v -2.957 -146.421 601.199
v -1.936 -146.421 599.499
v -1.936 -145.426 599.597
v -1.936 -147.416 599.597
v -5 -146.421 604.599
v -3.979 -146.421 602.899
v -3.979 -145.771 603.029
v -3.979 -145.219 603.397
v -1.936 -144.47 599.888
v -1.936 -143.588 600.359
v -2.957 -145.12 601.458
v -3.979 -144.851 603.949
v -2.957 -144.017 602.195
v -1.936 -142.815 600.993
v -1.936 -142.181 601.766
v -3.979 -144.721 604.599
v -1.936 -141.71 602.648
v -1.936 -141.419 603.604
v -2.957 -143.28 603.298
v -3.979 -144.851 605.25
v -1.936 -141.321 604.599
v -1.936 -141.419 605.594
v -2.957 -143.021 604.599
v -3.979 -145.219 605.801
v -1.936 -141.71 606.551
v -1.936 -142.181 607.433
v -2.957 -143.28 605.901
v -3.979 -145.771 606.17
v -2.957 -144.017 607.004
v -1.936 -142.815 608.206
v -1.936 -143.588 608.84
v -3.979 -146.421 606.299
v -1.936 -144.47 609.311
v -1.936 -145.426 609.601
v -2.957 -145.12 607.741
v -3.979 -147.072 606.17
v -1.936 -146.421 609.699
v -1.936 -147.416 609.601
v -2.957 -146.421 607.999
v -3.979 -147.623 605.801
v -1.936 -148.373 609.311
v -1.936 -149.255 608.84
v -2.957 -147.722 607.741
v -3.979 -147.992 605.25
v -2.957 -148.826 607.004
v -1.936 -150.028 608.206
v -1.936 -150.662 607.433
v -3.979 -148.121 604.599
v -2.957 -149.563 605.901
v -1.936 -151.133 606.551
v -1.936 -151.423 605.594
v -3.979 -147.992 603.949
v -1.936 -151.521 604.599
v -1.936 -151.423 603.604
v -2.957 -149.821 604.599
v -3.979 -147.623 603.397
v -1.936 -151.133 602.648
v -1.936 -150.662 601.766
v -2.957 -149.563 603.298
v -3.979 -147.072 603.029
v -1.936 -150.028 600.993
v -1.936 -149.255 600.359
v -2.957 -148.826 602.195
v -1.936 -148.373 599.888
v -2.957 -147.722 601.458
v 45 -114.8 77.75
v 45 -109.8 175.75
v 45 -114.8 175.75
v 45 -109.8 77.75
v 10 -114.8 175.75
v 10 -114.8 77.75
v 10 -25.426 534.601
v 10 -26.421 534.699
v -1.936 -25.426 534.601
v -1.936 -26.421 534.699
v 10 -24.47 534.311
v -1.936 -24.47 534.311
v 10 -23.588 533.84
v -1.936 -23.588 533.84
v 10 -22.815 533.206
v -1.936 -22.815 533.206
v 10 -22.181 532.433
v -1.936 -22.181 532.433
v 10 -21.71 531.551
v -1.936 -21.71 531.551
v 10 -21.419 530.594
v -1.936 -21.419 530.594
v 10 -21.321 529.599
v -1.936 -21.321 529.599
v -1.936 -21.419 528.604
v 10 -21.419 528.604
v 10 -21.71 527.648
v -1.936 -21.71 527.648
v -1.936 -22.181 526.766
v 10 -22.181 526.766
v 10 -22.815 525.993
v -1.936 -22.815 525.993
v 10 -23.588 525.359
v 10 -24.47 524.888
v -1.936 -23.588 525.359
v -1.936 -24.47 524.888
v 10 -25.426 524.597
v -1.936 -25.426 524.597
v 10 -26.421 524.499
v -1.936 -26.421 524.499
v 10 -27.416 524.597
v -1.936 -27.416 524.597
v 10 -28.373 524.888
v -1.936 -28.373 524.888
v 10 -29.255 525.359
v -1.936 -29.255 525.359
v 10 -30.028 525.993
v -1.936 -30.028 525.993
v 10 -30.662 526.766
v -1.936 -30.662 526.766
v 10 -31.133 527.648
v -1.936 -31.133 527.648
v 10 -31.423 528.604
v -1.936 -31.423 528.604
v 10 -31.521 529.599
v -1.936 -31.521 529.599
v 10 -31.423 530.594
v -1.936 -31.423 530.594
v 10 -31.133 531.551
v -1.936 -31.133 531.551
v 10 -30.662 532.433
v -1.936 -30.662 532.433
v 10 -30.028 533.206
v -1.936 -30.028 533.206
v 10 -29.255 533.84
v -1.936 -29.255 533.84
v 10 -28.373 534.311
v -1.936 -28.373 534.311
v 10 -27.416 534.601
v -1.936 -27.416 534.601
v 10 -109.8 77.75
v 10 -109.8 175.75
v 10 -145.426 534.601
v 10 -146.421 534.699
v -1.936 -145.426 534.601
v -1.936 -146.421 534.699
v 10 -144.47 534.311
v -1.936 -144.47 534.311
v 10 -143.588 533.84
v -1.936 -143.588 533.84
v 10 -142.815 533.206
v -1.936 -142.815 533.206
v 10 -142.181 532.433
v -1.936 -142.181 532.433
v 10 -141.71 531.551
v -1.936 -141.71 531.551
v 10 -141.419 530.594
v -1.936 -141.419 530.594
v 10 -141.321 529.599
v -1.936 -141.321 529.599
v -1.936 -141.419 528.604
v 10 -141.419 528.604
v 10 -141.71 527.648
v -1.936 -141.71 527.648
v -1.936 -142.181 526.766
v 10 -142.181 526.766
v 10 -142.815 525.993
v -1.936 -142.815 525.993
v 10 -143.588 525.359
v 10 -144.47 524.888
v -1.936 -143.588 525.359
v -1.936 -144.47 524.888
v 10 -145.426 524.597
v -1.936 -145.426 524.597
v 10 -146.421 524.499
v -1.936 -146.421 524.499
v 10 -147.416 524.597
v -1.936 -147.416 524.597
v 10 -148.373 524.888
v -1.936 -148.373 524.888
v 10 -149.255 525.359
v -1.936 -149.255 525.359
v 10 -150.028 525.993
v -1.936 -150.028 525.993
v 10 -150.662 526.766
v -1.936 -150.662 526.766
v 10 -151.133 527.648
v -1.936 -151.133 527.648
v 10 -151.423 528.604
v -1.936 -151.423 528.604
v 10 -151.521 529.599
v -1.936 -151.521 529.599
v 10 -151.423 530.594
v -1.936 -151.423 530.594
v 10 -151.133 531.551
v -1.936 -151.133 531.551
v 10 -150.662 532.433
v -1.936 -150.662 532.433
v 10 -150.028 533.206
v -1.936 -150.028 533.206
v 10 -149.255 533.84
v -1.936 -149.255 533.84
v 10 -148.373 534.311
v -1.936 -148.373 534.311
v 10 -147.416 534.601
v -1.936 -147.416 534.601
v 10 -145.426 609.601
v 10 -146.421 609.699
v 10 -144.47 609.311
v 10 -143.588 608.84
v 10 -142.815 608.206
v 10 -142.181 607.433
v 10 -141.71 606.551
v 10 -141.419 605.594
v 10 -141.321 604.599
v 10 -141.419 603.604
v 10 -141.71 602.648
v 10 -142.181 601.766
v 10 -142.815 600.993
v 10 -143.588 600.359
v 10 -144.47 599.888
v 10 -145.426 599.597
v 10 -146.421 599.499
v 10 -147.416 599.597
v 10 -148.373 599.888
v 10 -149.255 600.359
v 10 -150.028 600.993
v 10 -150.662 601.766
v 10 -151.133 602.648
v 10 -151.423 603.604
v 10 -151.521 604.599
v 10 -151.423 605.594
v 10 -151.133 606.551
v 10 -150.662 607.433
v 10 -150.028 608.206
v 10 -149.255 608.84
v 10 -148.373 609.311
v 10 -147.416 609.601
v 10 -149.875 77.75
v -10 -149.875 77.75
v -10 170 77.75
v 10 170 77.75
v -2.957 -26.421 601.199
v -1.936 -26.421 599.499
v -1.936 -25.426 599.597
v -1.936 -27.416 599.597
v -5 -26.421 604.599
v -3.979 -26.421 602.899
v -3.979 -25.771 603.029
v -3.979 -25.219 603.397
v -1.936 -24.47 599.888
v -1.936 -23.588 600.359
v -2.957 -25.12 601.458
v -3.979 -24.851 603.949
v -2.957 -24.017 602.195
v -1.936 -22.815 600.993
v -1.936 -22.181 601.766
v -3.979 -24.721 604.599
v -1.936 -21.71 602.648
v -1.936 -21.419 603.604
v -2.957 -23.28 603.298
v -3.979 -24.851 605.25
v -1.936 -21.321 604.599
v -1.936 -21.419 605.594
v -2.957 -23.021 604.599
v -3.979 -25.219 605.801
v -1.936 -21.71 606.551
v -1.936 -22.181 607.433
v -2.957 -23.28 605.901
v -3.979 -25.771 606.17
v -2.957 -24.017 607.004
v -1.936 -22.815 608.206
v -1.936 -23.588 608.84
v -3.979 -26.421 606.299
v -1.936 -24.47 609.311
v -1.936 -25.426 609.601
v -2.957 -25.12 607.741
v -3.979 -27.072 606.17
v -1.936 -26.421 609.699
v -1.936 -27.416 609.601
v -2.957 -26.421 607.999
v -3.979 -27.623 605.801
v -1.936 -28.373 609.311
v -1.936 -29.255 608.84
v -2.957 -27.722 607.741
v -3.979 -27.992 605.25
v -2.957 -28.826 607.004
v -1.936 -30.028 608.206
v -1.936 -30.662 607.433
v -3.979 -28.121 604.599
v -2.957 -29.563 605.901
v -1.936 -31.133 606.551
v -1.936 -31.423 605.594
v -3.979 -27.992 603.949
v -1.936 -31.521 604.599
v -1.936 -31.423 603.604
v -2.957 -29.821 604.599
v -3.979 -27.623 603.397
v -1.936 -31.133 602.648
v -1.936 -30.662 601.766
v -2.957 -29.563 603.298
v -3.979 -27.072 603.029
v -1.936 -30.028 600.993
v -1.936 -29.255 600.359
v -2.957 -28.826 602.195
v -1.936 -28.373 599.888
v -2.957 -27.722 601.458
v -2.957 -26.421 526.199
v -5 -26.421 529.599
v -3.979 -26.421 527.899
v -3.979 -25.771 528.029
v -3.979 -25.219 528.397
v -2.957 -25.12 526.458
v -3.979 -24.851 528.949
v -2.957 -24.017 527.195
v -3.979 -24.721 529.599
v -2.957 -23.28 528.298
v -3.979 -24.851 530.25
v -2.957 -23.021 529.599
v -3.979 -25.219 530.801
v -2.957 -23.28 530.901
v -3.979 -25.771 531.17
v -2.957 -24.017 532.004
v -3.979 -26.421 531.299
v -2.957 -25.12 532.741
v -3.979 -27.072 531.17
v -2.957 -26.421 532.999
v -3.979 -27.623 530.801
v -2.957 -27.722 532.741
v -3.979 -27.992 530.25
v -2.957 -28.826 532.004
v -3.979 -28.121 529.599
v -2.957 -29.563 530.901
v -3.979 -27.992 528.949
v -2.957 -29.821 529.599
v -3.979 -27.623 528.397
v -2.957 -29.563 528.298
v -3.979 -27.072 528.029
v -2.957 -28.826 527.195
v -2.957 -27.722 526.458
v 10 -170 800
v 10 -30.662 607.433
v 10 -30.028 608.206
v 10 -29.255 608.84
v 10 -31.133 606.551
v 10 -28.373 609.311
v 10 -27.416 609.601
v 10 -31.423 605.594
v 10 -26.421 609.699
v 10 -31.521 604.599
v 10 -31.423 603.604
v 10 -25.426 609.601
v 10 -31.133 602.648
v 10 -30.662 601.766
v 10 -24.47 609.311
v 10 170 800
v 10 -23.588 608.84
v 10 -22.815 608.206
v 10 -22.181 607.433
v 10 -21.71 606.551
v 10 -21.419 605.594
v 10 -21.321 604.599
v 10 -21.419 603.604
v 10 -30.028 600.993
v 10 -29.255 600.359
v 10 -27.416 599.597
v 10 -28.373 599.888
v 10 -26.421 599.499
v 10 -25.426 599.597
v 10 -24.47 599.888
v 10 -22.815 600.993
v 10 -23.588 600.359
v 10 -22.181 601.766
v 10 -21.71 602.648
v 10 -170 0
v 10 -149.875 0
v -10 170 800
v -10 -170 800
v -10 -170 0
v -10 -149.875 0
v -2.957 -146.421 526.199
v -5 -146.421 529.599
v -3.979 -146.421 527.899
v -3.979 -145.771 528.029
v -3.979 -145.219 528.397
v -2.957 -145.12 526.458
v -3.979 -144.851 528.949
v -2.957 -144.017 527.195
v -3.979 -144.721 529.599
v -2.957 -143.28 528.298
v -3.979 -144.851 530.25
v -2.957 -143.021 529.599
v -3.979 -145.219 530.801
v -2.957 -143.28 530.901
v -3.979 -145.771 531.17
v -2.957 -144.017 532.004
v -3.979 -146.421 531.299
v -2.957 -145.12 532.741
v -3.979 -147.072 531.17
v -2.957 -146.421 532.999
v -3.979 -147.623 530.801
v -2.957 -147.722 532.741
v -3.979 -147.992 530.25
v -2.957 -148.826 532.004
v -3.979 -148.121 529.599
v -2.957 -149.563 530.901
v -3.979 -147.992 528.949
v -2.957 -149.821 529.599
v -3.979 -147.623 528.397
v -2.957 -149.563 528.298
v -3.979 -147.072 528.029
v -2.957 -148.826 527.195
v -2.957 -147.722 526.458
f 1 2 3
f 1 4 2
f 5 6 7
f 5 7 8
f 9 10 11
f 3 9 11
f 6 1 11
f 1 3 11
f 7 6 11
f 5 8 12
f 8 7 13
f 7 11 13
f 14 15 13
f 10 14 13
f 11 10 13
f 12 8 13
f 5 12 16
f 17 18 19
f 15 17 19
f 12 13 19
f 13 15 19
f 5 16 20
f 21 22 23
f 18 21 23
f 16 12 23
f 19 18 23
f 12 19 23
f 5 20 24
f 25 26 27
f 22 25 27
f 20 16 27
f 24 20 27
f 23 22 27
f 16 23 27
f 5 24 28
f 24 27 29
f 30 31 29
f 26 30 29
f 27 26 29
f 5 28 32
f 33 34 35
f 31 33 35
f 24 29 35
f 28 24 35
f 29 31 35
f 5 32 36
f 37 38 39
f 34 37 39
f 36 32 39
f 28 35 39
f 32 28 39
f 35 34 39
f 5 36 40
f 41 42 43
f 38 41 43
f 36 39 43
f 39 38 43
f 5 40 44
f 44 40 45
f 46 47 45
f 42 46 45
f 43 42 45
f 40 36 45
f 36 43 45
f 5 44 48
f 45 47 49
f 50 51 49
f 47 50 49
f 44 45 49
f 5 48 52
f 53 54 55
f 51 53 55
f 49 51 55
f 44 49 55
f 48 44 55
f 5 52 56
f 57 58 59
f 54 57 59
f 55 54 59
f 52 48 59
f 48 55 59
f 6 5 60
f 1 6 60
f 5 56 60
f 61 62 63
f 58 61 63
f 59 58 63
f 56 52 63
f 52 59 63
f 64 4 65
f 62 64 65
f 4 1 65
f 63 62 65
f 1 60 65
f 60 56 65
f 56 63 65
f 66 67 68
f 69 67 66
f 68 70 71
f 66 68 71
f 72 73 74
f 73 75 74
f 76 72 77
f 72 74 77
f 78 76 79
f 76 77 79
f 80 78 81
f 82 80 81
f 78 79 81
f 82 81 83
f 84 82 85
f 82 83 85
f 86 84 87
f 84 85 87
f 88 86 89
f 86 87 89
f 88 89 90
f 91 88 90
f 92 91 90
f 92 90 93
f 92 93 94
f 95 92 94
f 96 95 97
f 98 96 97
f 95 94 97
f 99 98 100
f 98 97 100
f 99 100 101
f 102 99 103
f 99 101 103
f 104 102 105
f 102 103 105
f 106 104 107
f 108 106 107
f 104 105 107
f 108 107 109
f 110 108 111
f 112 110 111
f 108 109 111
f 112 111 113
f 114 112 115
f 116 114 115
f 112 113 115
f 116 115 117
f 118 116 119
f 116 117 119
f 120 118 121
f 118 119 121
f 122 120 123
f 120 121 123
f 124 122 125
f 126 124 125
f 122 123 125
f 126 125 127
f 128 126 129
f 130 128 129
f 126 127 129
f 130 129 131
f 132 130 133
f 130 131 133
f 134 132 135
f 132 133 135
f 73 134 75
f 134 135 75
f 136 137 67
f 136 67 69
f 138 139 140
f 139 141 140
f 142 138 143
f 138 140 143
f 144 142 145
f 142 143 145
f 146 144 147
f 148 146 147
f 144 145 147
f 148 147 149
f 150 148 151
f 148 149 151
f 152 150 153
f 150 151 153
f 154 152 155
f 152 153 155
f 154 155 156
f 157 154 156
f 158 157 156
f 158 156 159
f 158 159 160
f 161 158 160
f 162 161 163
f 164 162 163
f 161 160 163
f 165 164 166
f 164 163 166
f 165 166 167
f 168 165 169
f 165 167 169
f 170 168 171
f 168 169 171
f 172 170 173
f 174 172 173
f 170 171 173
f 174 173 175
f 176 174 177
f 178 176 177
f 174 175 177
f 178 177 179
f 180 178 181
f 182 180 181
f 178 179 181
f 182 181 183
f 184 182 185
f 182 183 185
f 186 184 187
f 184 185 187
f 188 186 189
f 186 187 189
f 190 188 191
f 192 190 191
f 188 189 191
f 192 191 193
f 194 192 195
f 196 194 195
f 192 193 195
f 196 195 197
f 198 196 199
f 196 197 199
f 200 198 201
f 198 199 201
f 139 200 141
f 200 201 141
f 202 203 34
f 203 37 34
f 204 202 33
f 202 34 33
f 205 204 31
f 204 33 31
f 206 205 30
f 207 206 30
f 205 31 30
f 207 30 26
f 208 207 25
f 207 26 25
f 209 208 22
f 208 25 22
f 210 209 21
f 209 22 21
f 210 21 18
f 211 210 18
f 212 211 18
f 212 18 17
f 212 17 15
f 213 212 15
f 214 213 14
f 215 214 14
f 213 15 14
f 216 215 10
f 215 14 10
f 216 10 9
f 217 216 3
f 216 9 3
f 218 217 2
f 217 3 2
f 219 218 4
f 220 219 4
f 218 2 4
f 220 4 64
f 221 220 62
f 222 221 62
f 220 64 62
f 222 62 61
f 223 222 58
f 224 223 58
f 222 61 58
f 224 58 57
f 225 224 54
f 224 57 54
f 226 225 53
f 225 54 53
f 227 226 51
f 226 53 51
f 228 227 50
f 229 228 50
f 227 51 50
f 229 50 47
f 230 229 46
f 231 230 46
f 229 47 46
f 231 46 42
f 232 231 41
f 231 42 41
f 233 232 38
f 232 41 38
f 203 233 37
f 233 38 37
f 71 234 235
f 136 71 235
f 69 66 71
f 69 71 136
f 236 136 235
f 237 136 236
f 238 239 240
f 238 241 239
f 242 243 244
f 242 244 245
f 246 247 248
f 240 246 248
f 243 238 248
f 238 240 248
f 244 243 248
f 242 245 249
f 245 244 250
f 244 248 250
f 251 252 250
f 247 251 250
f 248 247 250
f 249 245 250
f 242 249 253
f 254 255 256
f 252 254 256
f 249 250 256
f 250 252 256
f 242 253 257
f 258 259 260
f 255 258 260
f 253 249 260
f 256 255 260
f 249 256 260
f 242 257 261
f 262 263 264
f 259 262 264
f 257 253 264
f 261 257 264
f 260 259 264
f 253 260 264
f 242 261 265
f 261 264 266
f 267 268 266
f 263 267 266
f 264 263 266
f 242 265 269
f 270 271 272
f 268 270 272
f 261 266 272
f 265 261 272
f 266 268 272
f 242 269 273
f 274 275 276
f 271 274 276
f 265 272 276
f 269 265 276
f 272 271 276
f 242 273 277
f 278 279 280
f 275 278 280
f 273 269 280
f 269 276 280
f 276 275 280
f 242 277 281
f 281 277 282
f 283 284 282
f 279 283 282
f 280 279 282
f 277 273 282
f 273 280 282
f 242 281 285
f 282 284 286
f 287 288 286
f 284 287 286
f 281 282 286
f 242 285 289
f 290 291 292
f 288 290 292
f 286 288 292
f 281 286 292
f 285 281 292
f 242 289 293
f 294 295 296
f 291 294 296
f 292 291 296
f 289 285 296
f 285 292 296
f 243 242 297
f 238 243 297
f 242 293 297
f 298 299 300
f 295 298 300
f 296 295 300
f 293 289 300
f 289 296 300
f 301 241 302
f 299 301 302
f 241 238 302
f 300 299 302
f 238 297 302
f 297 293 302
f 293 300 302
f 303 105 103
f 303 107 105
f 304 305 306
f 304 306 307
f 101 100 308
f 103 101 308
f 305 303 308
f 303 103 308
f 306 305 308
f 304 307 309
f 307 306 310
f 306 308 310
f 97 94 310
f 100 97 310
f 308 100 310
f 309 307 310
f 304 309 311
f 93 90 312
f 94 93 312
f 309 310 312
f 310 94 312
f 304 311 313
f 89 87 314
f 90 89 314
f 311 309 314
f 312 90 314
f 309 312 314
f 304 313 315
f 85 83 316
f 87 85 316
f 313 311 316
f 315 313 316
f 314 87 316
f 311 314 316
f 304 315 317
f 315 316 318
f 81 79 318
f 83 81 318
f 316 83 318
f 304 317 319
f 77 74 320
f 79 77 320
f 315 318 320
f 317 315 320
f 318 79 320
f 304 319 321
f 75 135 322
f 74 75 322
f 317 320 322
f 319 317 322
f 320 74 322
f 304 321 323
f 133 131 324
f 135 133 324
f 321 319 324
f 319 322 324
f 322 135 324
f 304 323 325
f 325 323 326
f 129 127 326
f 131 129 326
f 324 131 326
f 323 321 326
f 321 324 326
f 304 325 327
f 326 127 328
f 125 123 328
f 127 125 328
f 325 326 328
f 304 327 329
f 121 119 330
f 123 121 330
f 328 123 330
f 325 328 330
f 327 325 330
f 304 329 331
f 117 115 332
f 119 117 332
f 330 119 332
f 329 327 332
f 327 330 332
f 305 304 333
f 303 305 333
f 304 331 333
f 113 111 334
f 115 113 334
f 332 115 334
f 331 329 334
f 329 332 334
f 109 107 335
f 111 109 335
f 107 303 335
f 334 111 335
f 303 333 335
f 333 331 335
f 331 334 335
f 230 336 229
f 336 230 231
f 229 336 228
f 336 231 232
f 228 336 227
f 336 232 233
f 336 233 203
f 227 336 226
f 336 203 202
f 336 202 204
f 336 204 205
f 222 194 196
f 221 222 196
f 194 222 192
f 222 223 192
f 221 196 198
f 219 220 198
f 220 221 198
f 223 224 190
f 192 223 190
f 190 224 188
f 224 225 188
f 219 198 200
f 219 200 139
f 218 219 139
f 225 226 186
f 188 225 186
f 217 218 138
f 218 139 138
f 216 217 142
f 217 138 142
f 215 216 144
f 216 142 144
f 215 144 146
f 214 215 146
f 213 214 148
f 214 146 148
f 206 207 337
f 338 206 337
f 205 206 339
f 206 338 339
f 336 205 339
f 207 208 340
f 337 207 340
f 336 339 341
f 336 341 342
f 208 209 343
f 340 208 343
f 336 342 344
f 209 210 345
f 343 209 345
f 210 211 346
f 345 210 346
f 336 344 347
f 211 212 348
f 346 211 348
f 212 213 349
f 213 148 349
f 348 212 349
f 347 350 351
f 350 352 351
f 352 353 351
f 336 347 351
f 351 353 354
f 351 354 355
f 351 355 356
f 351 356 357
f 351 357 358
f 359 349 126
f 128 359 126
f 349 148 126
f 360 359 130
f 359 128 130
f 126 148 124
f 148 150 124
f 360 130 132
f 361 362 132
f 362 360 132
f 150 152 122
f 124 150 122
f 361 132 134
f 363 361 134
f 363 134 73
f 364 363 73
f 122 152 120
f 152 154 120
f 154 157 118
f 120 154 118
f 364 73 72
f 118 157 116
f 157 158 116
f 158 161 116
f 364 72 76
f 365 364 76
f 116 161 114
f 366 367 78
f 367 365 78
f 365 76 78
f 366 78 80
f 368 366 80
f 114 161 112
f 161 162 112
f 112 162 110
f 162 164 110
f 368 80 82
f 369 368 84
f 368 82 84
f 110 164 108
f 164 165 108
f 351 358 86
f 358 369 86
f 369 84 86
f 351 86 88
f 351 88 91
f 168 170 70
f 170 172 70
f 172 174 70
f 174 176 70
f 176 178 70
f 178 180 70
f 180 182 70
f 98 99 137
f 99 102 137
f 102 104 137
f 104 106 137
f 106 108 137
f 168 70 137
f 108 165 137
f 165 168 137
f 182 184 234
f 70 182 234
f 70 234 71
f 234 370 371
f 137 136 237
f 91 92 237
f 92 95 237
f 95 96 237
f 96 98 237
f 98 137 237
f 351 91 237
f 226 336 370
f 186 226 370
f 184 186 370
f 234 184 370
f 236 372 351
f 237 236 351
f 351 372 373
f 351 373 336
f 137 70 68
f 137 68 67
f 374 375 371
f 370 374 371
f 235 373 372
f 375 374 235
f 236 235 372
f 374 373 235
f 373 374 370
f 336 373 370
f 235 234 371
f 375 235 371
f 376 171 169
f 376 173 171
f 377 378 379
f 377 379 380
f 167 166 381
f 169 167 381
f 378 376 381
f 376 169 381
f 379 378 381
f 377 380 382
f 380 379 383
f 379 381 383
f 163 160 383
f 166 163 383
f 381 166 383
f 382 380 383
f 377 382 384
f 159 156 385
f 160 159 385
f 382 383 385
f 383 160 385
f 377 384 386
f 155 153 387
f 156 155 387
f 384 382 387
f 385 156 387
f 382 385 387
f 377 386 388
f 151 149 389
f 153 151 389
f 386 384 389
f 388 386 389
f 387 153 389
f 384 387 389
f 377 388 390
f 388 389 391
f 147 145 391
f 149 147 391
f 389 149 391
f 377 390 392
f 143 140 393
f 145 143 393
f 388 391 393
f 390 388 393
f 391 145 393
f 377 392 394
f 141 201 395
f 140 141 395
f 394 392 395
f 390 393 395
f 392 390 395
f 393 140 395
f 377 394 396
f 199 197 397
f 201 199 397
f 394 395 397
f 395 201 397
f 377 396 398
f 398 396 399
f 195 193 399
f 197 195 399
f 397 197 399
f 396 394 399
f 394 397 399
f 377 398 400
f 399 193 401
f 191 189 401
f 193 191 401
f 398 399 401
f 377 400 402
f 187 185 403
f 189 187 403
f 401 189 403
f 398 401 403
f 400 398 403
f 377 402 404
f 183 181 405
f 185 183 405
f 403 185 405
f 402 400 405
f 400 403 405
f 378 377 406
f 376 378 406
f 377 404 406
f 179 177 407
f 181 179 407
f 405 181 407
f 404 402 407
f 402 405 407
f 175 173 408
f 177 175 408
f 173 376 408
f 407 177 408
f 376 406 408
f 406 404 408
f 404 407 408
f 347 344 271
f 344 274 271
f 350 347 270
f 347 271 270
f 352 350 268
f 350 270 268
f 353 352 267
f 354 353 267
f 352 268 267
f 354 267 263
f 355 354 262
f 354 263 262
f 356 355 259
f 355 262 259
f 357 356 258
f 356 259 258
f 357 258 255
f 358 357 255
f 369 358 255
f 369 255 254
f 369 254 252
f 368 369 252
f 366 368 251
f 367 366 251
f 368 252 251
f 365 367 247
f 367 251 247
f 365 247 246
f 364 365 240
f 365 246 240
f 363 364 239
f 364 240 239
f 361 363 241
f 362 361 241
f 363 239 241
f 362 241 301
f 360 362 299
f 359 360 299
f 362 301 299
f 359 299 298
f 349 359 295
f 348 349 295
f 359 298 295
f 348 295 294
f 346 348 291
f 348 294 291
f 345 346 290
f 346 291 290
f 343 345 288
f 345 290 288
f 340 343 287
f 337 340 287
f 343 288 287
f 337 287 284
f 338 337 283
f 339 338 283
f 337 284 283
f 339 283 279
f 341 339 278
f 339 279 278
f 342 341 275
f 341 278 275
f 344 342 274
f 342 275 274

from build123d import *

# Parameters (mm, degrees)
SKETCH_1_W              = 20
SKETCH_1_H              = 340
EXTRUDE_1_DEPTH         = 800
HOLE_WIZARD_M12_1_D     = 10.2
HOLE_WIZARD_M12_1_DEPTH = 11.935610843
HOLE_WIZARD_M12_1_TIP   = 3.064389157
SKETCH_5_W              = 77.75
SKETCH_5_H              = 319.875
CUT_EXTRUDE_1_DEPTH     = 819.107572389
SKETCH_6_W              = 98
SKETCH_6_H              = 5
EXTRUDE_2_DEPTH         = 35


with BuildPart() as part:
    # 草图1 → 凸台-拉伸1 (new body)
    with BuildSketch(Plane.XY):
        Rectangle(SKETCH_1_W, SKETCH_1_H)
    extrude(amount=EXTRUDE_1_DEPTH)

    # M12 螺纹孔1
    with Locations(Plane(origin=(10, 0, 0), x_dir=(0, 0, -1), z_dir=(1, 0, 0))):
        with Locations((-529.599389894, -26.421356237), (-529.599389894, -146.421356237), (-604.599389894, -146.421356237), (-604.599389894, -26.421356237)):
            Hole(HOLE_WIZARD_M12_1_D / 2, depth=HOLE_WIZARD_M12_1_DEPTH)
            with Locations((0, 0, -(HOLE_WIZARD_M12_1_DEPTH + HOLE_WIZARD_M12_1_TIP / 2))):  # 118° drill point
                Cone(0, HOLE_WIZARD_M12_1_D / 2, HOLE_WIZARD_M12_1_TIP, mode=Mode.SUBTRACT)

    # 草图5 → 切除-拉伸1 (cut, through all)
    with BuildSketch(Plane(origin=(10, 0, 0), x_dir=(0, 0, -1), z_dir=(1, 0, 0))):
        with Locations((-38.875, 10.0625)):
            Rectangle(SKETCH_5_W, SKETCH_5_H)
    extrude(amount=-CUT_EXTRUDE_1_DEPTH, mode=Mode.SUBTRACT)

    # 草图6 → 凸台-拉伸2 (add)
    with BuildSketch(Plane(origin=(10, 0, 0), x_dir=(0, 0, -1), z_dir=(1, 0, 0))):
        with Locations((-126.75, -112.3)):
            Rectangle(SKETCH_6_W, SKETCH_6_H)
    extrude(amount=EXTRUDE_2_DEPTH)


solid = part.part
